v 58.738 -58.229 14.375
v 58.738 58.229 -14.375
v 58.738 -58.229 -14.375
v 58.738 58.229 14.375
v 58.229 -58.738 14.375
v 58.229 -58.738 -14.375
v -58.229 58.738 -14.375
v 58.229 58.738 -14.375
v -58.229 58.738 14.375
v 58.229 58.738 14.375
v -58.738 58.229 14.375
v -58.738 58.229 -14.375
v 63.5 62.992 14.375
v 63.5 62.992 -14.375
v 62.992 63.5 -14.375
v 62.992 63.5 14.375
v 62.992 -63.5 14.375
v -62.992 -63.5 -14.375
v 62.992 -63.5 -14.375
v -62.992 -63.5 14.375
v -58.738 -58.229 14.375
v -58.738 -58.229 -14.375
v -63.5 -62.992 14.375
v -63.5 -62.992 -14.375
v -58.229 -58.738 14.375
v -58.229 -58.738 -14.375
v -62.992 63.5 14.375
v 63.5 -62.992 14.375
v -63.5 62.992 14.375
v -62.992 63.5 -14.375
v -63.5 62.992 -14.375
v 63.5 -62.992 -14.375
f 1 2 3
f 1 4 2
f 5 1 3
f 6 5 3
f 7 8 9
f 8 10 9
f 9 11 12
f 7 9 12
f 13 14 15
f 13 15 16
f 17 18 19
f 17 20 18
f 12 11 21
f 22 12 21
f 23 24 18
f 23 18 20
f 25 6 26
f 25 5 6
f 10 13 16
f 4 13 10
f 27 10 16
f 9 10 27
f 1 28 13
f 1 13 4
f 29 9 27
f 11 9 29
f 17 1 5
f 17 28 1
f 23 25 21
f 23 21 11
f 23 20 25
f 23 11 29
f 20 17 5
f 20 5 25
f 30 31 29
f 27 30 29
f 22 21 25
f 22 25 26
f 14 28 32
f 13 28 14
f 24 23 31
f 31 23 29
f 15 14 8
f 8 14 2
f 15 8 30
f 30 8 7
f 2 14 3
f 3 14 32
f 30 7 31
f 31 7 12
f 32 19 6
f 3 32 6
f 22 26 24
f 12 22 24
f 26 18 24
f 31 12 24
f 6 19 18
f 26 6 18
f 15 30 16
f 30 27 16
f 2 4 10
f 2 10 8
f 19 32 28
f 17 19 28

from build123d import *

# Parameters (mm, degrees)
EXTRUDE_THIN1_DEPTH = 14.375
CHAMFER1_SIZE       = 0.508


with BuildPart() as part:
    # Sketch2 → Extrude-Thin1 (new, symmetric)
    with BuildSketch(Plane.XY):
        Polygon((0, 63.5), (-63.5, 63.5), (-63.5, 0), (-58.7375, 0), (-58.7375, 58.7375), (0, 58.7375), align=None)
    extrude(amount=EXTRUDE_THIN1_DEPTH, both=True)

    # Chamfer1
    chamfer1_edges = [part.edges().sort_by_distance(p)[0] for p in [
        (-63.5, 63.5, 0),
        (-58.7375, 58.7375, 0),
    ]]
    chamfer(chamfer1_edges, length=CHAMFER1_SIZE)

    # Mirror1: part across plane


with BuildPart() as part_1:
    add(part.part)
    add(part.part.mirror(Plane(origin=(0, 63.5, 14.375), x_dir=(0, 0, 1), z_dir=(1, 0, 0))))

    # Mirror2: part across plane


with BuildPart() as part_2:
    add(part_1.part)
    add(part_1.part.mirror(Plane(origin=(-58.7375, 0, 14.375), x_dir=(0, 0, 1), z_dir=(0, -1, 0))))


solid = part_2.part
